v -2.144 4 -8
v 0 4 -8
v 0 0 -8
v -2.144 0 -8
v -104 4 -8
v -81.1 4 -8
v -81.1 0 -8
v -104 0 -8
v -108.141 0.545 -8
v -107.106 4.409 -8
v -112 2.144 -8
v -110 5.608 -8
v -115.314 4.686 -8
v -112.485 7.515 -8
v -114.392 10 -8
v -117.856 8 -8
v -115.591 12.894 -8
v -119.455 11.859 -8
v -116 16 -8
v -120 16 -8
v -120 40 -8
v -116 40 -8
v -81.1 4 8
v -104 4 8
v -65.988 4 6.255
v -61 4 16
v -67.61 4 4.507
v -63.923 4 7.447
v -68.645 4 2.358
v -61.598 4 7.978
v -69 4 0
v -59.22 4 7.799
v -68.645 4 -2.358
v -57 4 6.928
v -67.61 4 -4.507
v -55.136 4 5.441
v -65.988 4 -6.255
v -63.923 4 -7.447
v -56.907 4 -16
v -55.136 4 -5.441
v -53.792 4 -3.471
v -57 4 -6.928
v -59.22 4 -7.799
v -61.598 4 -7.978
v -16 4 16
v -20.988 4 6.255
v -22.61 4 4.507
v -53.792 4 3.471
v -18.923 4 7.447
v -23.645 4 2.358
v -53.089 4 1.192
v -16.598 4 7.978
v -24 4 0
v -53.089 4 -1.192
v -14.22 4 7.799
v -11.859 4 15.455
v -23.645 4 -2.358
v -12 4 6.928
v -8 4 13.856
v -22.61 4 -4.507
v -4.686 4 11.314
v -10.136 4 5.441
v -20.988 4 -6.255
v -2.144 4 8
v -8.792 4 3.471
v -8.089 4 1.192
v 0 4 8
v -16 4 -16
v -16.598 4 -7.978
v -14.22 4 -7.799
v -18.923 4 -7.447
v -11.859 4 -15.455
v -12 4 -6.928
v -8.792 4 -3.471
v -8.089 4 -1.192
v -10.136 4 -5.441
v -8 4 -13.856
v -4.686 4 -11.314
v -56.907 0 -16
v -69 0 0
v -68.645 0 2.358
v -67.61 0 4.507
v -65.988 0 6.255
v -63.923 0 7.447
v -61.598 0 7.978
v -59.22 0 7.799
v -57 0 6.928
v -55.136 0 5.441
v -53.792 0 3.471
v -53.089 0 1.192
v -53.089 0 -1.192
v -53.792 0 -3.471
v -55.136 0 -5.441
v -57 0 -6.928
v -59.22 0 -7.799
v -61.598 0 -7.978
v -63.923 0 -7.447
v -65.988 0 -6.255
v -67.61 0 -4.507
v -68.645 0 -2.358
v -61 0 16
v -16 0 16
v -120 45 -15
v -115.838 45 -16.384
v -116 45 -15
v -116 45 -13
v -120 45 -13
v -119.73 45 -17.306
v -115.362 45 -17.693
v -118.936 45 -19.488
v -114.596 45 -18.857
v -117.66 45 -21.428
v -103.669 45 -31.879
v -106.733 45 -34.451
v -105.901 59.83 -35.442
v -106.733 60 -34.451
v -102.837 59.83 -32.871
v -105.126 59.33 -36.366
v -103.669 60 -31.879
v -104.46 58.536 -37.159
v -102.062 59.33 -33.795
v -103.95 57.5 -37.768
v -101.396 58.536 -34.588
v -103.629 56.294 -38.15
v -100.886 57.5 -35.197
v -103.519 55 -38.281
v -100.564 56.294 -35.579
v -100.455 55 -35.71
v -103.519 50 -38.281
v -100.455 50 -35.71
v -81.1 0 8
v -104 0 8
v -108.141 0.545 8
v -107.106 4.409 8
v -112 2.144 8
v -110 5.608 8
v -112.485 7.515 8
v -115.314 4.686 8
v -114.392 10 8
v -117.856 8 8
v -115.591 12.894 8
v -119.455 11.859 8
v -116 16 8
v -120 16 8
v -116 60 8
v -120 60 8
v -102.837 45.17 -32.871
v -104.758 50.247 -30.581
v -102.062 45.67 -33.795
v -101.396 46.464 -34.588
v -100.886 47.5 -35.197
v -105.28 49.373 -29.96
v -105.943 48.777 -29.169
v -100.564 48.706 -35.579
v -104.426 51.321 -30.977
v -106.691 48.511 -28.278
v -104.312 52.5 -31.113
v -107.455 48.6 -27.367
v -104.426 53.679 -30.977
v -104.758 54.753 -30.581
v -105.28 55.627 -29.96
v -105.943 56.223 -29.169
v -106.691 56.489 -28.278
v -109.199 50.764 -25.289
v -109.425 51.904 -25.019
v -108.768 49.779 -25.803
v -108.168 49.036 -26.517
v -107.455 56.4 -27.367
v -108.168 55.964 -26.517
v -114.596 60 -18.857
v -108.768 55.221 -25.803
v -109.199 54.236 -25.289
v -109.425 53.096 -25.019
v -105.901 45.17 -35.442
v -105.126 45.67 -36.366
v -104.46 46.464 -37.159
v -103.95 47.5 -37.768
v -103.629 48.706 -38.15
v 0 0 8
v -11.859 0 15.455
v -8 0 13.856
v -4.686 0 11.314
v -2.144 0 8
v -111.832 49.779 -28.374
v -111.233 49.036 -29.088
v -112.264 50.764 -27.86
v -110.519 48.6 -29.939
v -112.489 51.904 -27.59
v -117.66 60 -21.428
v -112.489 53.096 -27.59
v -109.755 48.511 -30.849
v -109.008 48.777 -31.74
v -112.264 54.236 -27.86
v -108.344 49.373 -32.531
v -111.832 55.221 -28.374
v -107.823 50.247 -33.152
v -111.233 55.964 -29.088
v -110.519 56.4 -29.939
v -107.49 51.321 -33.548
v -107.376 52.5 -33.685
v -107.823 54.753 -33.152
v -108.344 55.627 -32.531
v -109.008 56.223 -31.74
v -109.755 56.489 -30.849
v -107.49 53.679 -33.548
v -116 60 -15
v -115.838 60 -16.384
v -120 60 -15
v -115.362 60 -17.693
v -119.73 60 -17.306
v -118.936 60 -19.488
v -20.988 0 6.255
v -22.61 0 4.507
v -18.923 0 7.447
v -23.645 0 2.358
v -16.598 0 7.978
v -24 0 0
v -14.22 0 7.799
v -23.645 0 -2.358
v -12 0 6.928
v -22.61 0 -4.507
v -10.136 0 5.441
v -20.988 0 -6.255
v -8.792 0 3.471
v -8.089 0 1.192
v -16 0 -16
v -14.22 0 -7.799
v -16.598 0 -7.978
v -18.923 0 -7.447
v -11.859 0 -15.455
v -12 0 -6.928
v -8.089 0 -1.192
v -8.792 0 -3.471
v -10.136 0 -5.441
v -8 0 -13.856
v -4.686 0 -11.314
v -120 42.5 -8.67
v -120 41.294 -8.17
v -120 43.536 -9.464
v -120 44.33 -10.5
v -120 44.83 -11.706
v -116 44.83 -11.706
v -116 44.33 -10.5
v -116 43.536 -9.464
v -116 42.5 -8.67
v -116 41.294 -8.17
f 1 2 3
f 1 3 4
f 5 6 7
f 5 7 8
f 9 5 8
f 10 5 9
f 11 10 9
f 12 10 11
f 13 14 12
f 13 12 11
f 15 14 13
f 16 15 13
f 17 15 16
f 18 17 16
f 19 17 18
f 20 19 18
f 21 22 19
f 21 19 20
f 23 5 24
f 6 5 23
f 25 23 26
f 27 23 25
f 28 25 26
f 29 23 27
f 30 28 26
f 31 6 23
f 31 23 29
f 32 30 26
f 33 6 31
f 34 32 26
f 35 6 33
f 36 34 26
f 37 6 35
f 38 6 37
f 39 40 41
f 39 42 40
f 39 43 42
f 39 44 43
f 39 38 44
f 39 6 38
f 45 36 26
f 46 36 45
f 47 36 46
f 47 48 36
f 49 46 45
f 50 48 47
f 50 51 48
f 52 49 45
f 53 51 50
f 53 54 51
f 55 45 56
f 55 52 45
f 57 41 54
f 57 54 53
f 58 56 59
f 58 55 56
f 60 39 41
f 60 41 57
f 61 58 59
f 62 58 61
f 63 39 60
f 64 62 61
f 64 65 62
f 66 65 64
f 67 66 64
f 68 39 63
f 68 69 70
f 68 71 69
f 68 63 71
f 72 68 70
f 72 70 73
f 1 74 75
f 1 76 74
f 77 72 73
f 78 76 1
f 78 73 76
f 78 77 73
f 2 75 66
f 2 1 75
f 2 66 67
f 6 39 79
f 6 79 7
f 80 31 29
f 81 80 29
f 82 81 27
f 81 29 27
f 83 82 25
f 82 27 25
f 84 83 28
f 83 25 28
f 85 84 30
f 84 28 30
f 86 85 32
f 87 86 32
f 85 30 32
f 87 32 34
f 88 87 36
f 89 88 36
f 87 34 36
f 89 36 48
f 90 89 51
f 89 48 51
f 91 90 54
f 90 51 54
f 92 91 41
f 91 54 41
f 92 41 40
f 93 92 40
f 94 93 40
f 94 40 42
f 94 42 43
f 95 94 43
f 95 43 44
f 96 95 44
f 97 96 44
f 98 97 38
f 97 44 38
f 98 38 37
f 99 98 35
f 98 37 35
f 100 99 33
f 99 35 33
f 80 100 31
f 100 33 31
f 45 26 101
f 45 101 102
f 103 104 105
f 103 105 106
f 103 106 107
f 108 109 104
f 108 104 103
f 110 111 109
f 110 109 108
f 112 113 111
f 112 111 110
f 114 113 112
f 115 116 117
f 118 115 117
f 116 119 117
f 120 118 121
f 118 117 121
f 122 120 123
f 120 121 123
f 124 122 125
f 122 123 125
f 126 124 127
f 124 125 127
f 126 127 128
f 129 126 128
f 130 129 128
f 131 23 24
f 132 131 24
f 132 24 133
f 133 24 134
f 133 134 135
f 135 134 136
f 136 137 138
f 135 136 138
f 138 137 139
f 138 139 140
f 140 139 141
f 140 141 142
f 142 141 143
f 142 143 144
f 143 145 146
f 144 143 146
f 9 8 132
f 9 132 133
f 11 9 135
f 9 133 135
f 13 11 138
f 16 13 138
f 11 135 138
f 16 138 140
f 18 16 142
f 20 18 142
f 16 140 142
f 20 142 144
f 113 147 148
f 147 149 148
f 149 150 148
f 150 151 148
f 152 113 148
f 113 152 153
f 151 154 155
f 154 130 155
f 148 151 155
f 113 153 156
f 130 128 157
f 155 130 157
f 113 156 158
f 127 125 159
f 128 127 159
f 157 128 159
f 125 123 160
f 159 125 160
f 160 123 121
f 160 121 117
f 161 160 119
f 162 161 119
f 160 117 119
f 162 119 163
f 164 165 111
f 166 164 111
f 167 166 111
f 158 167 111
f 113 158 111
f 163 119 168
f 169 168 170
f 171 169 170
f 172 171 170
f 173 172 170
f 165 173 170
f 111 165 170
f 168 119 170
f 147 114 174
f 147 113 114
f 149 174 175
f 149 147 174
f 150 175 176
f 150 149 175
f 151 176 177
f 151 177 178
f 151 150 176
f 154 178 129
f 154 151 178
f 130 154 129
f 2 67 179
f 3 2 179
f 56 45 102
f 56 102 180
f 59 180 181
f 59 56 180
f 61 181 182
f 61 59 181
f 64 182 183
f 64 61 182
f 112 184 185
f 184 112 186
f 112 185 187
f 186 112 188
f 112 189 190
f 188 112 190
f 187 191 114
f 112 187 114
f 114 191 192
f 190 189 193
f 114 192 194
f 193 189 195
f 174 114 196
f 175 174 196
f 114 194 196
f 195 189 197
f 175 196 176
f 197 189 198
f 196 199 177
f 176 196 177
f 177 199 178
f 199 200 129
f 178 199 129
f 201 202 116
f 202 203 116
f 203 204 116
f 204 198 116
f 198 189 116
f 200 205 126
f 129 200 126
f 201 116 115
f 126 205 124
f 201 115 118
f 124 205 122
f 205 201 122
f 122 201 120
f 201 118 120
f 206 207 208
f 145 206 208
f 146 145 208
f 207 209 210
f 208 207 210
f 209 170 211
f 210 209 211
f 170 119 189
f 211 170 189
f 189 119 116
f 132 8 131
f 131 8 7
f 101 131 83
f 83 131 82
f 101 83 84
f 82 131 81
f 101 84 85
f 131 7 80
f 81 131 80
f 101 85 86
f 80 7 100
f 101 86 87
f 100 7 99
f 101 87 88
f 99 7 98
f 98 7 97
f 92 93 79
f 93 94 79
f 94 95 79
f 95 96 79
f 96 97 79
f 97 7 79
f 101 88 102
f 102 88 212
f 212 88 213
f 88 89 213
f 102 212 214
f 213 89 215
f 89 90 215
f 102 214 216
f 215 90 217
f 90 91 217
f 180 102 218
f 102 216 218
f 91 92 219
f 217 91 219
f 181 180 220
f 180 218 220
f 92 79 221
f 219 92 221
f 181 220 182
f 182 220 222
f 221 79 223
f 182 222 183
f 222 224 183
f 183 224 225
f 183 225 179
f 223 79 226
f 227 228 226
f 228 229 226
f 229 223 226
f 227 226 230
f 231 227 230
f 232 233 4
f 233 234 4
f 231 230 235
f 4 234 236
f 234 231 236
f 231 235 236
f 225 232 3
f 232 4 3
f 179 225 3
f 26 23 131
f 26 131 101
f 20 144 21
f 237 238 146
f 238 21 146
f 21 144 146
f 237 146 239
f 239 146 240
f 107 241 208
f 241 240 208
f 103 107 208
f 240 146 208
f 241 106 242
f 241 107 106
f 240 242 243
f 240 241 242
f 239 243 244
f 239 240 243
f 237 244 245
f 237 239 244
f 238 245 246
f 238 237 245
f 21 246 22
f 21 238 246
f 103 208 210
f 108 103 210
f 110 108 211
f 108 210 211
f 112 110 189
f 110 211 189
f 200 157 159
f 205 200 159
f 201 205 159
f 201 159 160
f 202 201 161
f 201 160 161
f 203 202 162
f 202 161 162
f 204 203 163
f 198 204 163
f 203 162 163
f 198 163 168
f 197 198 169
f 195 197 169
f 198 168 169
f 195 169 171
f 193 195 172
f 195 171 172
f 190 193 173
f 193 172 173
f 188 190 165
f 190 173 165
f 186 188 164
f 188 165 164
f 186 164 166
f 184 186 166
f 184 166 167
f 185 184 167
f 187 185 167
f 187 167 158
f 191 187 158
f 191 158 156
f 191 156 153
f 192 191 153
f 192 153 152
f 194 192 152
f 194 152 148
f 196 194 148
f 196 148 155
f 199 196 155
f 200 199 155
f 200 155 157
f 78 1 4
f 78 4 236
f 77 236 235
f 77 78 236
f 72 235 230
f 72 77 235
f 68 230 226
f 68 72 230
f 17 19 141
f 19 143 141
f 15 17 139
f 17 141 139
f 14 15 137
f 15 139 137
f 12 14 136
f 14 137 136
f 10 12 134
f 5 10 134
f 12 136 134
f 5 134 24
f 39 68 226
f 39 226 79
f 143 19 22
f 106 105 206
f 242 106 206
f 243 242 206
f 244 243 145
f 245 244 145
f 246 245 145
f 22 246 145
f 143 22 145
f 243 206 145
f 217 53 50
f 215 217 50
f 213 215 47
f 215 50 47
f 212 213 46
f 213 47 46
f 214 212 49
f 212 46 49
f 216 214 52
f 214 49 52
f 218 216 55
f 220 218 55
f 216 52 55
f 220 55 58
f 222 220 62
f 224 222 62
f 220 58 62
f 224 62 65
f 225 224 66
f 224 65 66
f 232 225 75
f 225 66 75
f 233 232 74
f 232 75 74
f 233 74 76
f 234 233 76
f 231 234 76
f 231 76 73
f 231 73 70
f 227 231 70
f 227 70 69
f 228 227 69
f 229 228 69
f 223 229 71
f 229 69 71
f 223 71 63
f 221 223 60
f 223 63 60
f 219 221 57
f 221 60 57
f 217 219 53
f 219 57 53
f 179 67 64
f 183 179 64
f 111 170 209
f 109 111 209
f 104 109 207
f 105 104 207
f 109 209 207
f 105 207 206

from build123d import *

# Parameters (mm, degrees)
EXTRUDE_THIN1_DEPTH = 8
BOSS_EXTRUDE4_DEPTH = 4
SKETCH3_3_R         = 8
CUT_EXTRUDE1_DEPTH  = 4
EXTRUDE_THIN2_DEPTH = 15
FILLET1_R           = 5
FILLET2_R           = 5
SKETCH5_R           = 4
CUT_EXTRUDE2_DEPTH  = 15


with BuildPart() as part:
    # Sketch1 → Extrude-Thin1 (new, symmetric)
    with BuildSketch(Plane.XY):
        with BuildLine():
            Line((0, 0), (-104, 0))
            ThreePointArc((-104, 0), (-115.313708499, 4.686291501), (-120, 16))
            Line((-120, 16), (-120, 60))
            Line((-120, 60), (-116, 60))
            Line((-116, 60), (-116, 16))
            ThreePointArc((-116, 16), (-112.485281374, 7.514718626), (-104, 4))
            Line((-104, 4), (0, 4))
            Line((0, 4), (0, 0))
        make_face()
    extrude(amount=EXTRUDE_THIN1_DEPTH, both=True)

    # Sketch3 → Boss-Extrude4 (add)
    with BuildSketch(Plane(origin=(0, 4, 0), x_dir=(1, 0, 0), z_dir=(0, 1, 0))):
        with BuildLine():
            Line((-81.100288315, 8), (-61, 8))
            ThreePointArc((-61, 8), (-53, 0), (-61, -8))
            Line((-61, -8), (-81.100288315, -8))
            Line((-81.100288315, -8), (-61, -16))
            Line((-61, -16), (-16, -16))
            ThreePointArc((-16, -16), (-8, -13.856406461), (-2.143593539, -8))
            Line((-2.143593539, -8), (-29.856406461, -8))
            ThreePointArc((-29.856406461, -8), (-32, 0), (-29.856406461, 8))
            Line((-29.856406461, 8), (-2.143593539, 8))
            ThreePointArc((-2.143593539, 8), (-8, 13.856406461), (-16, 16))
            Line((-16, 16), (-56.906606086, 16))
            Line((-56.906606086, 16), (-81.100288315, 8))
        make_face()
    extrude(amount=-BOSS_EXTRUDE4_DEPTH)

    # Sketch3<3> → Cut-Extrude1 (cut)
    with BuildSketch(Plane(origin=(0, 4, 0), x_dir=(1, 0, 0), z_dir=(0, 1, 0))):
        with Locations((-16, 0)):
            Circle(SKETCH3_3_R)
        with Locations((-61, 0)):
            Circle(SKETCH3_3_R)
    extrude(amount=-CUT_EXTRUDE1_DEPTH, mode=Mode.SUBTRACT)

    # Sketch4 → Extrude-Thin2 (add)
    with BuildSketch(Plane(origin=(0, 60, 0), x_dir=(1, 0, 0), z_dir=(0, 1, 0))):
        with BuildLine():
            Line((-120, 8), (-120, 15))
            ThreePointArc((-120, 15), (-119.396926208, 18.420201433), (-117.660444431, 21.427876097))
            Line((-117.660444431, 21.427876097), (-103.519117018, 38.280853845))
            Line((-103.519117018, 38.280853845), (-100.454939246, 35.709703407))
            Line((-100.454939246, 35.709703407), (-114.596266659, 18.856725658))
            ThreePointArc((-114.596266659, 18.856725658), (-115.638155725, 17.05212086), (-116, 15))
            Line((-116, 15), (-116, 8))
            Line((-116, 8), (-120, 8))
        make_face()
    extrude(amount=-EXTRUDE_THIN2_DEPTH)

    # Fillet1
    fillet1_edges = [part.edges().sort_by_distance(p)[0] for p in [
        (-118, 45, -8),
    ]]
    fillet(fillet1_edges, radius=FILLET1_R)

    # Fillet2
    fillet2_edges = [part.edges().sort_by_distance(p)[0] for p in [
        (-101.987028132, 45, -36.995278626),
        (-101.987028132, 60, -36.995278626),
    ]]
    fillet(fillet2_edges, radius=FILLET2_R)

    # Sketch5 → Cut-Extrude2 (cut)
    with BuildSketch(Plane(origin=(-76.532974578, 0, -64.218790741), x_dir=(0.6427876096865437, 0, -0.7660444431189745), z_dir=(0.7660444431189746, 0, 0.6427876096865437))):
        with Locations((-47.215970419, 52.5)):
            Circle(SKETCH5_R)
    extrude(amount=-CUT_EXTRUDE2_DEPTH, mode=Mode.SUBTRACT)


solid = part.part
